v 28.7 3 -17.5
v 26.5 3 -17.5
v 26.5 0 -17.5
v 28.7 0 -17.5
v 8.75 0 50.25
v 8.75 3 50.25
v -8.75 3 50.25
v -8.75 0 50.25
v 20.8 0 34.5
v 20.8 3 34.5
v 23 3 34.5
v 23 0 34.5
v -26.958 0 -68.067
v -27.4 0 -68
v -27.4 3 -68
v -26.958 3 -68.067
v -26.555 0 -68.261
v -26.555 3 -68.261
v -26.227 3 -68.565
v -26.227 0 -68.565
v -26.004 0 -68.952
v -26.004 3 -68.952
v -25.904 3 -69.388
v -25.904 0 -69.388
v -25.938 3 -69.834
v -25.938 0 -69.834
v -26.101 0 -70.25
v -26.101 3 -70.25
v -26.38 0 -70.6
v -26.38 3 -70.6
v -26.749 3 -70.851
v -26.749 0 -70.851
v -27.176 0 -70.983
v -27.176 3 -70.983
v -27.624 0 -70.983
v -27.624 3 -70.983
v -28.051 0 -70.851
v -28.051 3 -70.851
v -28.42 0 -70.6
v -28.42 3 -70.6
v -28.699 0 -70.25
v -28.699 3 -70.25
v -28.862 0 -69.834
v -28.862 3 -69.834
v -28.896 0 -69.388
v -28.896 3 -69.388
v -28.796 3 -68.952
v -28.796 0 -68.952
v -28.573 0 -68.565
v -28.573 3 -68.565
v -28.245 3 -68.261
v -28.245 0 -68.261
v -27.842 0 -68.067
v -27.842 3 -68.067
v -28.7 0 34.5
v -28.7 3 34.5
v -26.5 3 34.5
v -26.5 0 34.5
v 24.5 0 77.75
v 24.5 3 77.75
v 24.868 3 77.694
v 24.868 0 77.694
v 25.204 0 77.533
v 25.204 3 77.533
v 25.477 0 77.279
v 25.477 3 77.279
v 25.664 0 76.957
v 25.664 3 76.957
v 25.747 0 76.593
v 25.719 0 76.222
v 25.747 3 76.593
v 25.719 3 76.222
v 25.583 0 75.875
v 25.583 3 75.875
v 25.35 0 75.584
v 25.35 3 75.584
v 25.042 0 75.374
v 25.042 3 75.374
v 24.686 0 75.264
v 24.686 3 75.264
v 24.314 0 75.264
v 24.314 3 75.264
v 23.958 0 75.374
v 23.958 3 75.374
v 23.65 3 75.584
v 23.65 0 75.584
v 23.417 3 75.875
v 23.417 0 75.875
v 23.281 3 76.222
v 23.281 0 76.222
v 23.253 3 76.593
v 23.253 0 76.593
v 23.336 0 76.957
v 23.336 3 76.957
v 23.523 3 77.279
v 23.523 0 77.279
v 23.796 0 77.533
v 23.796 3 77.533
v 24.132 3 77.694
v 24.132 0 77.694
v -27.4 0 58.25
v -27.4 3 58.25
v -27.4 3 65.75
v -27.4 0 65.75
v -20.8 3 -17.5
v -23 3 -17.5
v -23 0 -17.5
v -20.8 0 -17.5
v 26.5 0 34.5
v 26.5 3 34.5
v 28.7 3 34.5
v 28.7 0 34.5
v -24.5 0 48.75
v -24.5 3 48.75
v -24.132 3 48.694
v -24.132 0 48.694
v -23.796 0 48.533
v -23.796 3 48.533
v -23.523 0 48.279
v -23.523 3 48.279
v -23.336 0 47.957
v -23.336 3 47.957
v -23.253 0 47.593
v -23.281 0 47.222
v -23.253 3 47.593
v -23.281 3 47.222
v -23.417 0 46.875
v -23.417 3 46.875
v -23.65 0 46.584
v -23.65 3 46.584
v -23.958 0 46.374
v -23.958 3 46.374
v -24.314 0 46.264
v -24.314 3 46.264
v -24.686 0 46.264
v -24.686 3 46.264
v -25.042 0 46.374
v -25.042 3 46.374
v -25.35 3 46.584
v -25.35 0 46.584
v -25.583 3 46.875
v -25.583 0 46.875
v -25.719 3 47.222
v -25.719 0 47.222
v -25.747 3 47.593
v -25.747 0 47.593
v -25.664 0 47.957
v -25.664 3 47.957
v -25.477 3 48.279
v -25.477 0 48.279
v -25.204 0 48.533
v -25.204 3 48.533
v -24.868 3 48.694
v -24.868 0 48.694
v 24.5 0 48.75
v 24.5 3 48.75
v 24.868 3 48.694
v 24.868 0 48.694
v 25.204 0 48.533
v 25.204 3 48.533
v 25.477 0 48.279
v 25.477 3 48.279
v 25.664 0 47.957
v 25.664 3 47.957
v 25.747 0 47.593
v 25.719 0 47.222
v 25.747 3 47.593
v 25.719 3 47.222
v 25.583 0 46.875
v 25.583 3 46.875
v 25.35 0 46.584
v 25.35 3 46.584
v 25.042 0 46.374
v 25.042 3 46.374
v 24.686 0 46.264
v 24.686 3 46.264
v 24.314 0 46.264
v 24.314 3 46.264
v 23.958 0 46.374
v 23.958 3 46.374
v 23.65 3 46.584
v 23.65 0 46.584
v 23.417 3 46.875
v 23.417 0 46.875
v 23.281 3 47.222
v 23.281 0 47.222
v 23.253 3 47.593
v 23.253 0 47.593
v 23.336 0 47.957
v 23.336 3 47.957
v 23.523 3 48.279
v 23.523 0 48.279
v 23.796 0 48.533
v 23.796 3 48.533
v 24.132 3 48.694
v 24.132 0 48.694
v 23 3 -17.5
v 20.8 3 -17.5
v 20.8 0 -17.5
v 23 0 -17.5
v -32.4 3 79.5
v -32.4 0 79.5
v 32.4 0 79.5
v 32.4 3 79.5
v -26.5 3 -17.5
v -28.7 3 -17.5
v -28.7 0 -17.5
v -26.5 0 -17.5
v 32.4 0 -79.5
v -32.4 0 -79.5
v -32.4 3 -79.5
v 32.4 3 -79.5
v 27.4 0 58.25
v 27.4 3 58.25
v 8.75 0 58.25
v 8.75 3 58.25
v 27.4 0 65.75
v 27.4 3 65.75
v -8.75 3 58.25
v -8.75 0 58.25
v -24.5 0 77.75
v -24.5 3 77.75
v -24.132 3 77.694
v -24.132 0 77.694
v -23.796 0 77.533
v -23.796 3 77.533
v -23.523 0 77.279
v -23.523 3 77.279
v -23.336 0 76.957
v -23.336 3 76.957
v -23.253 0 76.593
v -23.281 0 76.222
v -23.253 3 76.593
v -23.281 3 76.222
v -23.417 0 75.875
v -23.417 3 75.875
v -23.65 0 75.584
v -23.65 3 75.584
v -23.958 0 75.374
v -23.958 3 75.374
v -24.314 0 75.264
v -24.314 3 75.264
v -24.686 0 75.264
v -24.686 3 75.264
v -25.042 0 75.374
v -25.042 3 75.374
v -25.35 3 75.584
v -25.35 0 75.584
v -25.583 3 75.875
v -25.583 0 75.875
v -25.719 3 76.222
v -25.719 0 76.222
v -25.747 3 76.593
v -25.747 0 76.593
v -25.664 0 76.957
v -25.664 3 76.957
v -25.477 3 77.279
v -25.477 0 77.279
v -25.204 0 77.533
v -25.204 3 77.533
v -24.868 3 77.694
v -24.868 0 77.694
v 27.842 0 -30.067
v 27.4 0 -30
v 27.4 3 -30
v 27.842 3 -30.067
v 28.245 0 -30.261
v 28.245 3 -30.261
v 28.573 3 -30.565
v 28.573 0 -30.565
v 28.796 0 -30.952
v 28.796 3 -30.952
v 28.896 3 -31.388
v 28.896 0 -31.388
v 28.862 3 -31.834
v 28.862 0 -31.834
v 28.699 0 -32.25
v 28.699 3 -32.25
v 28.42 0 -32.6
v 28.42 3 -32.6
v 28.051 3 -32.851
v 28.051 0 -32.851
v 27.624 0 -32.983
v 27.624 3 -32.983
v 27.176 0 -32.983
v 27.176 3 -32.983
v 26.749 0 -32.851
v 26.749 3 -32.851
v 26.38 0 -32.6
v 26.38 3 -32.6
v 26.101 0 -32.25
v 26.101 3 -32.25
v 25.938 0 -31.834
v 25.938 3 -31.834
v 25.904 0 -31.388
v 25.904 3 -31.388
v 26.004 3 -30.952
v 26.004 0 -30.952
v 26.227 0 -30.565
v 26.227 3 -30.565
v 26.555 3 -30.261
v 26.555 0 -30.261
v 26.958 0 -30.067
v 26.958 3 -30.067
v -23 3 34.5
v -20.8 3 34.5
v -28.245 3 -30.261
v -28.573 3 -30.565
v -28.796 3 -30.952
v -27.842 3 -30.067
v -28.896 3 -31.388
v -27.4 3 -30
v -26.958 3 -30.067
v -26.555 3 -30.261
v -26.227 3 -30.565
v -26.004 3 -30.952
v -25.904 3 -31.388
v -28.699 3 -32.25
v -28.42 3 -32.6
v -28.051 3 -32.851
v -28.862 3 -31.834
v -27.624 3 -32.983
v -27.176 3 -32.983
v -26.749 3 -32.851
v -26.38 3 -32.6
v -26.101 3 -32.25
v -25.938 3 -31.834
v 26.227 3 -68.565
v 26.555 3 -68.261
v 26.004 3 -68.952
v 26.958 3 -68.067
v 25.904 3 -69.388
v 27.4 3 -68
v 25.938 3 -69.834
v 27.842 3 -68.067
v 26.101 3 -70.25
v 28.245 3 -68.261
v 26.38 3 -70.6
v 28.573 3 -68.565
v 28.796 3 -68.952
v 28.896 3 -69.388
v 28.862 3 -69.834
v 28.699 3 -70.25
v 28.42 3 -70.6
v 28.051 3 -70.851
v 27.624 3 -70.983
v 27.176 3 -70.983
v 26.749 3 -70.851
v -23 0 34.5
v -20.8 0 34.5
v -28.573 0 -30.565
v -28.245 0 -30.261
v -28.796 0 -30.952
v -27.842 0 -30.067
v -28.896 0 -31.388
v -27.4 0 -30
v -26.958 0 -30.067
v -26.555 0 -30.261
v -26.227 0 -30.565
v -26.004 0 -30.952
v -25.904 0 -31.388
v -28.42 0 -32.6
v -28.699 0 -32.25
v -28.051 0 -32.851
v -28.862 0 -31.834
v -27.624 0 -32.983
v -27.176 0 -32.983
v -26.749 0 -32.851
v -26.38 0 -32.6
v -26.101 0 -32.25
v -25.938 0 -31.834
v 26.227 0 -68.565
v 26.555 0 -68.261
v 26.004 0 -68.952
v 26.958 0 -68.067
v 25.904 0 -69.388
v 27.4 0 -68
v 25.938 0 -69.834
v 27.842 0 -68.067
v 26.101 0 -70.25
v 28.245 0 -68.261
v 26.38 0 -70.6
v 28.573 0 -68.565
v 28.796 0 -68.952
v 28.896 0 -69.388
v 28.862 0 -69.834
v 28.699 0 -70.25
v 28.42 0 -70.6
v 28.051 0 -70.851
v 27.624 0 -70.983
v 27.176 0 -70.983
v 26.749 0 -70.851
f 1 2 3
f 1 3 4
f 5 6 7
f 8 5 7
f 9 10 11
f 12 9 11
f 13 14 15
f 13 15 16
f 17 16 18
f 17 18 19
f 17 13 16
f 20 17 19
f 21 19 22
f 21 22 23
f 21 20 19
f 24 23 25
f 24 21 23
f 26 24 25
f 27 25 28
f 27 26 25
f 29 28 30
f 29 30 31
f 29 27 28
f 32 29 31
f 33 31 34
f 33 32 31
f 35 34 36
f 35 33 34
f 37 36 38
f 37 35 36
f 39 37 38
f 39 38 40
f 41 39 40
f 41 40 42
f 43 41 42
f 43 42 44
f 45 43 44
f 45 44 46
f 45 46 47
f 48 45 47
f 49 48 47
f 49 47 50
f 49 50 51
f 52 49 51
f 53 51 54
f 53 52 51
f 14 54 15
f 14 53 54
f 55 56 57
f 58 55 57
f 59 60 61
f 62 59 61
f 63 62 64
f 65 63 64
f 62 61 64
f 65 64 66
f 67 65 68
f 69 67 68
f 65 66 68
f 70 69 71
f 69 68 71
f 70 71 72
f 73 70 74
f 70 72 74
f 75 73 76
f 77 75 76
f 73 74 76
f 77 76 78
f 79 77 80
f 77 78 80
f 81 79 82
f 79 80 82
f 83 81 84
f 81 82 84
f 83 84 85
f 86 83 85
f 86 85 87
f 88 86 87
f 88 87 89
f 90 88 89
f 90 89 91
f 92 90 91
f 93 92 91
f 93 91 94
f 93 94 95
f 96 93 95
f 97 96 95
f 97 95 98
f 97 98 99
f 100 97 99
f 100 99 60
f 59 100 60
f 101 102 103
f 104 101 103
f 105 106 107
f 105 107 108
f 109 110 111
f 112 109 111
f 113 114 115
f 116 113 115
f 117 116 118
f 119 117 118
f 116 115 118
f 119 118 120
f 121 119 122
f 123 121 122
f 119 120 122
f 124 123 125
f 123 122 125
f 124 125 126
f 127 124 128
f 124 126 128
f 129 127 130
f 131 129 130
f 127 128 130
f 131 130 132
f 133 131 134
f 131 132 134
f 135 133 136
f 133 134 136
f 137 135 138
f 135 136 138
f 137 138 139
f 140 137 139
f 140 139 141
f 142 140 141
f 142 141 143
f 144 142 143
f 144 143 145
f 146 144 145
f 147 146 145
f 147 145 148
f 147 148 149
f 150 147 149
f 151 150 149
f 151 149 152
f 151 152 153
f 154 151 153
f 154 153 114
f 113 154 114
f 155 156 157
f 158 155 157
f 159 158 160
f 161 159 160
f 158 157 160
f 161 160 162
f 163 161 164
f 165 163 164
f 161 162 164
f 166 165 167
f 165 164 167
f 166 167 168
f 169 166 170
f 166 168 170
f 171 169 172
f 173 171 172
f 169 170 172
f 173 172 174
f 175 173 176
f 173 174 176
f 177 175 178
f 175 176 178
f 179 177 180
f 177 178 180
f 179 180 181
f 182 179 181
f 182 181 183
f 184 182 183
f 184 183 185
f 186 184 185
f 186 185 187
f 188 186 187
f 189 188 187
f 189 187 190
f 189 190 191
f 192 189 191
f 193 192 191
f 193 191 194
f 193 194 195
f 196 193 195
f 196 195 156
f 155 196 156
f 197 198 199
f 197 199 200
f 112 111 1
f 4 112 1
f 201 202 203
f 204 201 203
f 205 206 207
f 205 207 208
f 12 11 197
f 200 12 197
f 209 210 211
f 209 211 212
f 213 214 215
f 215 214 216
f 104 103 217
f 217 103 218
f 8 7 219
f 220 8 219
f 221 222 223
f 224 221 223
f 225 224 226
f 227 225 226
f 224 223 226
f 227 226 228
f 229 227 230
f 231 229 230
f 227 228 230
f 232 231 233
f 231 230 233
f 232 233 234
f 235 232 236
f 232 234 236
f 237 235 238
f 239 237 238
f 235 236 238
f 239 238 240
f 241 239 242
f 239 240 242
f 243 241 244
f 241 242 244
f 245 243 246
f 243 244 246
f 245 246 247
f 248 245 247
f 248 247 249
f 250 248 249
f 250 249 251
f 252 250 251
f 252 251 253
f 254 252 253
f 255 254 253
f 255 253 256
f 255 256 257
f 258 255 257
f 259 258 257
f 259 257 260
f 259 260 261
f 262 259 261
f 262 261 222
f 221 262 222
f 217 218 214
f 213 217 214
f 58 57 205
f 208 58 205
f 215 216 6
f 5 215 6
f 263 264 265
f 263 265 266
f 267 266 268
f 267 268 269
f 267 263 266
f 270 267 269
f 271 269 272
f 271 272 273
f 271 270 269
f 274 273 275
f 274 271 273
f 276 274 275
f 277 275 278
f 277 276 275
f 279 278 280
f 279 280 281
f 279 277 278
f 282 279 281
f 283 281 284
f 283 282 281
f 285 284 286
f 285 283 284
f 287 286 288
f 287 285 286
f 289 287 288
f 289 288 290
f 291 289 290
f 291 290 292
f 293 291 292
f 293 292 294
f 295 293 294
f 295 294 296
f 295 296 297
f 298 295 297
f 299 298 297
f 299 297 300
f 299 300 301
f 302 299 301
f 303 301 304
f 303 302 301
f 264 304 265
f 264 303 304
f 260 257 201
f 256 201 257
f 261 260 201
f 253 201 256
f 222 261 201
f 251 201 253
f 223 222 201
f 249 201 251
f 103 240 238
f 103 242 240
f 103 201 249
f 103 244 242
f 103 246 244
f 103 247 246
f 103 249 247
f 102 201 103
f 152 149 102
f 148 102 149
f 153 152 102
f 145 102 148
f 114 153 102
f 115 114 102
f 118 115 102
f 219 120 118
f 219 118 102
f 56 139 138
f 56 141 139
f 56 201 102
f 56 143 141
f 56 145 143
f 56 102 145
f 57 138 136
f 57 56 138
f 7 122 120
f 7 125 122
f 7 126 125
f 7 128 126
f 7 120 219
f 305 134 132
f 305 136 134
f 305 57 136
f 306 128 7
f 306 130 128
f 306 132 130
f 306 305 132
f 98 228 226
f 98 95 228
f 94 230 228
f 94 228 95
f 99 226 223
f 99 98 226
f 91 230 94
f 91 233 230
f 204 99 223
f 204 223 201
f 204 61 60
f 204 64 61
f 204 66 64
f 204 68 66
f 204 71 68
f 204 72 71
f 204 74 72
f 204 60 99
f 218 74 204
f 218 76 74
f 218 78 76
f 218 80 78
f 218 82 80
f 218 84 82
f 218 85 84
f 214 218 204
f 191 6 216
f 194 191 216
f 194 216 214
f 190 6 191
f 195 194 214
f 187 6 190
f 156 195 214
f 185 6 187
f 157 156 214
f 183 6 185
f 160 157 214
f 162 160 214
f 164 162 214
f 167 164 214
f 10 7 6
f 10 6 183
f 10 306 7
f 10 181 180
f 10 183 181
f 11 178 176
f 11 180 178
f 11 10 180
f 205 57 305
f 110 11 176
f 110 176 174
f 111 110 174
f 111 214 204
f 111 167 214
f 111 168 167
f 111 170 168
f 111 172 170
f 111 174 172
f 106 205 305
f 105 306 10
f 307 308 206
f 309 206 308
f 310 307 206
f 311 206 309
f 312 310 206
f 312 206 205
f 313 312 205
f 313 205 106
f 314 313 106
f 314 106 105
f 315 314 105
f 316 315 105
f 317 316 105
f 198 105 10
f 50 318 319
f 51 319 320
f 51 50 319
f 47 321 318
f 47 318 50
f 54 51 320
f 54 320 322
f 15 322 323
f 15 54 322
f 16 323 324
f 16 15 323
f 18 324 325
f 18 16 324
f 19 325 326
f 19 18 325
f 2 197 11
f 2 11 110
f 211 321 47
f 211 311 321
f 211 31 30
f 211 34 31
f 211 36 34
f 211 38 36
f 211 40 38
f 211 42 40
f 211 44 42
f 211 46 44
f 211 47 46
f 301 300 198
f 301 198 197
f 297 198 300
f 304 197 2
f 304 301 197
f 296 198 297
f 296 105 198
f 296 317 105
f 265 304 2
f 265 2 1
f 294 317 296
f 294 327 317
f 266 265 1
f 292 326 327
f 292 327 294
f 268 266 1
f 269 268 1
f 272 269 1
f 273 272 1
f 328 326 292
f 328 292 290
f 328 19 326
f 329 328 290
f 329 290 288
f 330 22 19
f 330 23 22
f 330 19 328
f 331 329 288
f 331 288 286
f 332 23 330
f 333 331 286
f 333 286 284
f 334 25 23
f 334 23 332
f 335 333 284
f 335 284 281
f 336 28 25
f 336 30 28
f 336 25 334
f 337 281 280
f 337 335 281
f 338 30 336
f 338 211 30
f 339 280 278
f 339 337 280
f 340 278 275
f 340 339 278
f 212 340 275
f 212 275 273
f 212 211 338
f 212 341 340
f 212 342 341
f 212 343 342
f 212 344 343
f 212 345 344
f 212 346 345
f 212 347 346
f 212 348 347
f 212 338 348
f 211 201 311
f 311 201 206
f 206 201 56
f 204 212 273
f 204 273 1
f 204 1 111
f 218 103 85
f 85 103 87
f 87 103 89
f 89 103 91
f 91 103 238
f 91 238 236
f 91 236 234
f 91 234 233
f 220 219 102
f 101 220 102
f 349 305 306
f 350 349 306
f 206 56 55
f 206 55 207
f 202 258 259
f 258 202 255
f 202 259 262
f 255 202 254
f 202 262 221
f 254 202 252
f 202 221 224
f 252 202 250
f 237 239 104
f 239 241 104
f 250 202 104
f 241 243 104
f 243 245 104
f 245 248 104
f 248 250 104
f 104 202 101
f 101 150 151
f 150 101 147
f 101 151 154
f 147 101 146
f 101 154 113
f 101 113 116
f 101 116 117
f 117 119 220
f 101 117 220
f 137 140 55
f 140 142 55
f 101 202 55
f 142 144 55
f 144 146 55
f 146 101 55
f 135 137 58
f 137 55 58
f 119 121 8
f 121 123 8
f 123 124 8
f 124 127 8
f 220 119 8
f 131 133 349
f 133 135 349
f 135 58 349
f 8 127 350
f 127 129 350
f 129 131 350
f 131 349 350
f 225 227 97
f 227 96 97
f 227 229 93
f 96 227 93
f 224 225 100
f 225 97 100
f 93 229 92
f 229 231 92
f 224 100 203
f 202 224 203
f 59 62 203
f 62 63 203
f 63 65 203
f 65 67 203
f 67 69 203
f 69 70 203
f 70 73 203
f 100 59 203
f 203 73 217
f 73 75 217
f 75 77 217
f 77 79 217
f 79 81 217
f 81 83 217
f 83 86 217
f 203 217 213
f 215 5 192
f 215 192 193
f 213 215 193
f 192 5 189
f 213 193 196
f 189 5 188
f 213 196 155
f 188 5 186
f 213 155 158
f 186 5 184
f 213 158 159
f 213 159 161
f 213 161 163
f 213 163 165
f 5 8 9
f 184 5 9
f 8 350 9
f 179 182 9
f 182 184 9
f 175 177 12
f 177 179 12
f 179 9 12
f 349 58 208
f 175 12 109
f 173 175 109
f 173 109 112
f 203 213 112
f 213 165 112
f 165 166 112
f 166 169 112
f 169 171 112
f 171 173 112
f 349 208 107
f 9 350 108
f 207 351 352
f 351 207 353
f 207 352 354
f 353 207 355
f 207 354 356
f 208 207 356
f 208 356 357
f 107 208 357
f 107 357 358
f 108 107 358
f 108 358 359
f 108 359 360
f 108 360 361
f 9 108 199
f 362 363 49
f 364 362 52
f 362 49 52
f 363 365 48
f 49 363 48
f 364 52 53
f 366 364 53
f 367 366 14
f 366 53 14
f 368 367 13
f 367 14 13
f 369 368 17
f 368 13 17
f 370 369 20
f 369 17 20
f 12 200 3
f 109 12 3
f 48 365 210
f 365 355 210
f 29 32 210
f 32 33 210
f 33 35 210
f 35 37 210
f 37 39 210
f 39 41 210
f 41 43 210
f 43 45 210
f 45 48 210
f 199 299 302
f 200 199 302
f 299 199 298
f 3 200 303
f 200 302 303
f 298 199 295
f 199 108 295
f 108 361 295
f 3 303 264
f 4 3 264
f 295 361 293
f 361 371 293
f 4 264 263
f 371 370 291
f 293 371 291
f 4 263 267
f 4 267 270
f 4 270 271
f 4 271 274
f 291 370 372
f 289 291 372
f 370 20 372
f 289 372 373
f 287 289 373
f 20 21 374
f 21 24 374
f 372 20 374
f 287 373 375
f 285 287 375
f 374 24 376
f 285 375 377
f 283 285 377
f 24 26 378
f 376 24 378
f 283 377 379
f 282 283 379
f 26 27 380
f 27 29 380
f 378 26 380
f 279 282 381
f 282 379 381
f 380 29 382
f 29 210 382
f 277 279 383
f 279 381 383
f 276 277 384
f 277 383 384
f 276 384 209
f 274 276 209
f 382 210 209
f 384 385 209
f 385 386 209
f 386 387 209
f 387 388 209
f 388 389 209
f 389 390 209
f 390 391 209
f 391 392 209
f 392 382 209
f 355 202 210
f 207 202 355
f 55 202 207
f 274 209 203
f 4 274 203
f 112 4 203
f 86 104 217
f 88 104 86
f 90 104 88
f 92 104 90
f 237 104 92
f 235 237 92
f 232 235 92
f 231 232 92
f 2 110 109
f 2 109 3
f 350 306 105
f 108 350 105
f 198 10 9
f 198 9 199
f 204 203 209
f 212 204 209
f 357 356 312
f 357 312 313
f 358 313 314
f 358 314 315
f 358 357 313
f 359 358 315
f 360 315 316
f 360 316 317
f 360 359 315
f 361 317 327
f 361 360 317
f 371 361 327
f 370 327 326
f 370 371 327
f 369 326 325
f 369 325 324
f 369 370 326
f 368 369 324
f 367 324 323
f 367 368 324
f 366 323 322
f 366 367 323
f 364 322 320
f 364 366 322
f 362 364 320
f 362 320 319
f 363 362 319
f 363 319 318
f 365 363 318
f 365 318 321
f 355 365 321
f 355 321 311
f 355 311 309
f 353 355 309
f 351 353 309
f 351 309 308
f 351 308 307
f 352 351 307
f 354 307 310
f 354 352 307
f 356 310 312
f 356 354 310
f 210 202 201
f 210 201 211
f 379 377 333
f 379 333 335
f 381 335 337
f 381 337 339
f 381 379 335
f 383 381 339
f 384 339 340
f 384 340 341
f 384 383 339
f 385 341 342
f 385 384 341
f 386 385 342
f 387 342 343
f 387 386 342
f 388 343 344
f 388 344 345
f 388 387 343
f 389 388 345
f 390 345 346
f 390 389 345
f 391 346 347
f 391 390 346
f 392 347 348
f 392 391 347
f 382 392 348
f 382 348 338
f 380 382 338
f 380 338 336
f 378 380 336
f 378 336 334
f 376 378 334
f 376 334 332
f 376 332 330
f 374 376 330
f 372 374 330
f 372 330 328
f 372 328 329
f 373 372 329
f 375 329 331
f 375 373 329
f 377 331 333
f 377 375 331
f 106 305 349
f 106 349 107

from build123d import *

# Parameters (mm, degrees)
SKETCH1_W           = 64.8
SKETCH1_H           = 159
SKETCH1_R           = 1.5
BOSS_EXTRUDE1_DEPTH = 3
SKETCH7_W           = 2.2
SKETCH7_H           = 52
CUT_EXTRUDE4_DEPTH  = 86.901164136
CUT_EXTRUDE6_DEPTH  = 86.901164136
SKETCH12_R          = 1.25
CUT_EXTRUDE8_DEPTH  = 10


with BuildPart() as part:
    # Sketch1 → Boss-Extrude1 (new body)
    with BuildSketch(Plane(origin=(0, 0, 0), x_dir=(1, 0, 0), z_dir=(0, 1, 0))):
        Rectangle(SKETCH1_W, SKETCH1_H)
        with Locations(Location((-27.4, 69.5, 0), (0, 0, 270))):
            Circle(SKETCH1_R, mode=Mode.SUBTRACT)
        with Locations(Location((27.4, 69.5, 0), (0, 0, 270))):
            Circle(SKETCH1_R, mode=Mode.SUBTRACT)
        with Locations(Location((27.4, 31.5, 0), (0, 0, 270))):
            Circle(SKETCH1_R, mode=Mode.SUBTRACT)
        with Locations(Location((-27.4, 31.5, 0), (0, 0, 270))):
            Circle(SKETCH1_R, mode=Mode.SUBTRACT)
    extrude(amount=BOSS_EXTRUDE1_DEPTH)

    # Sketch7 → Cut-Extrude4 (cut, through all)
    with BuildSketch(Plane(origin=(0, 3, 0), x_dir=(1, 0, 0), z_dir=(0, 1, 0))):
        with Locations((-27.6, -8.5)):
            Rectangle(SKETCH7_W, SKETCH7_H)
        with Locations((27.6, -8.5)):
            Rectangle(SKETCH7_W, SKETCH7_H)
        with Locations((-21.9, -8.5)):
            Rectangle(SKETCH7_W, SKETCH7_H)
        with Locations((21.9, -8.5)):
            Rectangle(SKETCH7_W, SKETCH7_H)
    extrude(amount=-CUT_EXTRUDE4_DEPTH, mode=Mode.SUBTRACT)

    # Sketch9 → Cut-Extrude6 (cut, through all)
    with BuildSketch(Plane(origin=(0, 3, 0), x_dir=(1, 0, 0), z_dir=(0, 1, 0))):
        Polygon((-27.4, -65.75), (27.4, -65.75), (27.4, -58.25), (8.75, -58.25), (8.75, -50.25), (-8.75, -50.25), (-8.75, -58.25), (-27.4, -58.25), align=None)
    extrude(amount=-CUT_EXTRUDE6_DEPTH, mode=Mode.SUBTRACT)

    # Sketch12 → Cut-Extrude8 (cut)
    with BuildSketch(Plane(origin=(0, 3, 0), x_dir=(1, 0, 0), z_dir=(0, 1, 0))):
        with Locations(Location((-24.5, -47.5, 0), (0, 0, 270))):
            Circle(SKETCH12_R)
        with Locations(Location((24.5, -47.5, 0), (0, 0, 270))):
            Circle(SKETCH12_R)
        with Locations(Location((24.5, -76.5, 0), (0, 0, 270))):
            Circle(SKETCH12_R)
        with Locations(Location((-24.5, -76.5, 0), (0, 0, 270))):
            Circle(SKETCH12_R)
    extrude(amount=-CUT_EXTRUDE8_DEPTH, mode=Mode.SUBTRACT)


solid = part.part
